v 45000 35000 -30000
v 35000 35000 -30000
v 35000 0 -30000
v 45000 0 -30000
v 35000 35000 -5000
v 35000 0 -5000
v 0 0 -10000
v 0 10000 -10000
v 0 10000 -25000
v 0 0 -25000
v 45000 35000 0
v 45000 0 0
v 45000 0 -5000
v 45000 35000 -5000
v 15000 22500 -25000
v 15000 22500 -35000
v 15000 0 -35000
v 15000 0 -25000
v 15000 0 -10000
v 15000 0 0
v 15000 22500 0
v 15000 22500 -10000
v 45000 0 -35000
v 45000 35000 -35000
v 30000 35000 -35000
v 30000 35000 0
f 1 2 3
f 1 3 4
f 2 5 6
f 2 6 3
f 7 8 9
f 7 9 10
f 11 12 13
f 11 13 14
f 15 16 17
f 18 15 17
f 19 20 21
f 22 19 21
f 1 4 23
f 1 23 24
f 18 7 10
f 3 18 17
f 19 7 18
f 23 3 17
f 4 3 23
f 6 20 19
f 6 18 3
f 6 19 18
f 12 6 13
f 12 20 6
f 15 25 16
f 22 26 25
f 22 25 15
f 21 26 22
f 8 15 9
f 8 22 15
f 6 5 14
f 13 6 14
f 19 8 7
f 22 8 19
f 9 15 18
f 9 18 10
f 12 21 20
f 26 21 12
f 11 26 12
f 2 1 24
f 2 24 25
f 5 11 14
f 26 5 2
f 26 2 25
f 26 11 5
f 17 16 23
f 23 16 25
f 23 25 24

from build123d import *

# Parameters (mm, degrees)
BOSS_EXTRUDE1_DEPTH = 35000
SKETCH3_W           = 10000
SKETCH3_H           = 25000
CUT_EXTRUDE1_DEPTH  = 66896.440801298
CUT_EXTRUDE2_DEPTH  = 10000
CUT_EXTRUDE3_DEPTH  = 10000


with BuildPart() as part:
    # Sketch1 → Boss-Extrude1 (new body)
    with BuildSketch(Plane.XY):
        Polygon((0, 0), (45000, 0), (45000, 35000), (30000, 35000), (0, 10000), align=None)
    extrude(amount=-BOSS_EXTRUDE1_DEPTH)

    # Sketch3 → Cut-Extrude1 (cut, through all)
    with BuildSketch(Plane(origin=(0, 35000, 0), x_dir=(1, 0, 0), z_dir=(0, 1, 0))):
        with Locations((40000, 17500)):
            Rectangle(SKETCH3_W, SKETCH3_H)
    extrude(amount=-CUT_EXTRUDE1_DEPTH, mode=Mode.SUBTRACT)

    # Sketch4 → Cut-Extrude2 (cut)
    with BuildSketch(Plane.XY):
        Polygon((0, 0), (15000, 0), (15000, 22500), (0, 10000), align=None)
    extrude(amount=-CUT_EXTRUDE2_DEPTH, mode=Mode.SUBTRACT)

    # Sketch5 → Cut-Extrude3 (cut)
    with BuildSketch(Plane(origin=(0, 0, -35000), x_dir=(-1, 0, 0), z_dir=(0, 0, -1))):
        Polygon((0, 10000), (-15000, 22500), (-15000, 0), (0, 0), align=None)
    extrude(amount=-CUT_EXTRUDE3_DEPTH, mode=Mode.SUBTRACT)


solid = part.part
